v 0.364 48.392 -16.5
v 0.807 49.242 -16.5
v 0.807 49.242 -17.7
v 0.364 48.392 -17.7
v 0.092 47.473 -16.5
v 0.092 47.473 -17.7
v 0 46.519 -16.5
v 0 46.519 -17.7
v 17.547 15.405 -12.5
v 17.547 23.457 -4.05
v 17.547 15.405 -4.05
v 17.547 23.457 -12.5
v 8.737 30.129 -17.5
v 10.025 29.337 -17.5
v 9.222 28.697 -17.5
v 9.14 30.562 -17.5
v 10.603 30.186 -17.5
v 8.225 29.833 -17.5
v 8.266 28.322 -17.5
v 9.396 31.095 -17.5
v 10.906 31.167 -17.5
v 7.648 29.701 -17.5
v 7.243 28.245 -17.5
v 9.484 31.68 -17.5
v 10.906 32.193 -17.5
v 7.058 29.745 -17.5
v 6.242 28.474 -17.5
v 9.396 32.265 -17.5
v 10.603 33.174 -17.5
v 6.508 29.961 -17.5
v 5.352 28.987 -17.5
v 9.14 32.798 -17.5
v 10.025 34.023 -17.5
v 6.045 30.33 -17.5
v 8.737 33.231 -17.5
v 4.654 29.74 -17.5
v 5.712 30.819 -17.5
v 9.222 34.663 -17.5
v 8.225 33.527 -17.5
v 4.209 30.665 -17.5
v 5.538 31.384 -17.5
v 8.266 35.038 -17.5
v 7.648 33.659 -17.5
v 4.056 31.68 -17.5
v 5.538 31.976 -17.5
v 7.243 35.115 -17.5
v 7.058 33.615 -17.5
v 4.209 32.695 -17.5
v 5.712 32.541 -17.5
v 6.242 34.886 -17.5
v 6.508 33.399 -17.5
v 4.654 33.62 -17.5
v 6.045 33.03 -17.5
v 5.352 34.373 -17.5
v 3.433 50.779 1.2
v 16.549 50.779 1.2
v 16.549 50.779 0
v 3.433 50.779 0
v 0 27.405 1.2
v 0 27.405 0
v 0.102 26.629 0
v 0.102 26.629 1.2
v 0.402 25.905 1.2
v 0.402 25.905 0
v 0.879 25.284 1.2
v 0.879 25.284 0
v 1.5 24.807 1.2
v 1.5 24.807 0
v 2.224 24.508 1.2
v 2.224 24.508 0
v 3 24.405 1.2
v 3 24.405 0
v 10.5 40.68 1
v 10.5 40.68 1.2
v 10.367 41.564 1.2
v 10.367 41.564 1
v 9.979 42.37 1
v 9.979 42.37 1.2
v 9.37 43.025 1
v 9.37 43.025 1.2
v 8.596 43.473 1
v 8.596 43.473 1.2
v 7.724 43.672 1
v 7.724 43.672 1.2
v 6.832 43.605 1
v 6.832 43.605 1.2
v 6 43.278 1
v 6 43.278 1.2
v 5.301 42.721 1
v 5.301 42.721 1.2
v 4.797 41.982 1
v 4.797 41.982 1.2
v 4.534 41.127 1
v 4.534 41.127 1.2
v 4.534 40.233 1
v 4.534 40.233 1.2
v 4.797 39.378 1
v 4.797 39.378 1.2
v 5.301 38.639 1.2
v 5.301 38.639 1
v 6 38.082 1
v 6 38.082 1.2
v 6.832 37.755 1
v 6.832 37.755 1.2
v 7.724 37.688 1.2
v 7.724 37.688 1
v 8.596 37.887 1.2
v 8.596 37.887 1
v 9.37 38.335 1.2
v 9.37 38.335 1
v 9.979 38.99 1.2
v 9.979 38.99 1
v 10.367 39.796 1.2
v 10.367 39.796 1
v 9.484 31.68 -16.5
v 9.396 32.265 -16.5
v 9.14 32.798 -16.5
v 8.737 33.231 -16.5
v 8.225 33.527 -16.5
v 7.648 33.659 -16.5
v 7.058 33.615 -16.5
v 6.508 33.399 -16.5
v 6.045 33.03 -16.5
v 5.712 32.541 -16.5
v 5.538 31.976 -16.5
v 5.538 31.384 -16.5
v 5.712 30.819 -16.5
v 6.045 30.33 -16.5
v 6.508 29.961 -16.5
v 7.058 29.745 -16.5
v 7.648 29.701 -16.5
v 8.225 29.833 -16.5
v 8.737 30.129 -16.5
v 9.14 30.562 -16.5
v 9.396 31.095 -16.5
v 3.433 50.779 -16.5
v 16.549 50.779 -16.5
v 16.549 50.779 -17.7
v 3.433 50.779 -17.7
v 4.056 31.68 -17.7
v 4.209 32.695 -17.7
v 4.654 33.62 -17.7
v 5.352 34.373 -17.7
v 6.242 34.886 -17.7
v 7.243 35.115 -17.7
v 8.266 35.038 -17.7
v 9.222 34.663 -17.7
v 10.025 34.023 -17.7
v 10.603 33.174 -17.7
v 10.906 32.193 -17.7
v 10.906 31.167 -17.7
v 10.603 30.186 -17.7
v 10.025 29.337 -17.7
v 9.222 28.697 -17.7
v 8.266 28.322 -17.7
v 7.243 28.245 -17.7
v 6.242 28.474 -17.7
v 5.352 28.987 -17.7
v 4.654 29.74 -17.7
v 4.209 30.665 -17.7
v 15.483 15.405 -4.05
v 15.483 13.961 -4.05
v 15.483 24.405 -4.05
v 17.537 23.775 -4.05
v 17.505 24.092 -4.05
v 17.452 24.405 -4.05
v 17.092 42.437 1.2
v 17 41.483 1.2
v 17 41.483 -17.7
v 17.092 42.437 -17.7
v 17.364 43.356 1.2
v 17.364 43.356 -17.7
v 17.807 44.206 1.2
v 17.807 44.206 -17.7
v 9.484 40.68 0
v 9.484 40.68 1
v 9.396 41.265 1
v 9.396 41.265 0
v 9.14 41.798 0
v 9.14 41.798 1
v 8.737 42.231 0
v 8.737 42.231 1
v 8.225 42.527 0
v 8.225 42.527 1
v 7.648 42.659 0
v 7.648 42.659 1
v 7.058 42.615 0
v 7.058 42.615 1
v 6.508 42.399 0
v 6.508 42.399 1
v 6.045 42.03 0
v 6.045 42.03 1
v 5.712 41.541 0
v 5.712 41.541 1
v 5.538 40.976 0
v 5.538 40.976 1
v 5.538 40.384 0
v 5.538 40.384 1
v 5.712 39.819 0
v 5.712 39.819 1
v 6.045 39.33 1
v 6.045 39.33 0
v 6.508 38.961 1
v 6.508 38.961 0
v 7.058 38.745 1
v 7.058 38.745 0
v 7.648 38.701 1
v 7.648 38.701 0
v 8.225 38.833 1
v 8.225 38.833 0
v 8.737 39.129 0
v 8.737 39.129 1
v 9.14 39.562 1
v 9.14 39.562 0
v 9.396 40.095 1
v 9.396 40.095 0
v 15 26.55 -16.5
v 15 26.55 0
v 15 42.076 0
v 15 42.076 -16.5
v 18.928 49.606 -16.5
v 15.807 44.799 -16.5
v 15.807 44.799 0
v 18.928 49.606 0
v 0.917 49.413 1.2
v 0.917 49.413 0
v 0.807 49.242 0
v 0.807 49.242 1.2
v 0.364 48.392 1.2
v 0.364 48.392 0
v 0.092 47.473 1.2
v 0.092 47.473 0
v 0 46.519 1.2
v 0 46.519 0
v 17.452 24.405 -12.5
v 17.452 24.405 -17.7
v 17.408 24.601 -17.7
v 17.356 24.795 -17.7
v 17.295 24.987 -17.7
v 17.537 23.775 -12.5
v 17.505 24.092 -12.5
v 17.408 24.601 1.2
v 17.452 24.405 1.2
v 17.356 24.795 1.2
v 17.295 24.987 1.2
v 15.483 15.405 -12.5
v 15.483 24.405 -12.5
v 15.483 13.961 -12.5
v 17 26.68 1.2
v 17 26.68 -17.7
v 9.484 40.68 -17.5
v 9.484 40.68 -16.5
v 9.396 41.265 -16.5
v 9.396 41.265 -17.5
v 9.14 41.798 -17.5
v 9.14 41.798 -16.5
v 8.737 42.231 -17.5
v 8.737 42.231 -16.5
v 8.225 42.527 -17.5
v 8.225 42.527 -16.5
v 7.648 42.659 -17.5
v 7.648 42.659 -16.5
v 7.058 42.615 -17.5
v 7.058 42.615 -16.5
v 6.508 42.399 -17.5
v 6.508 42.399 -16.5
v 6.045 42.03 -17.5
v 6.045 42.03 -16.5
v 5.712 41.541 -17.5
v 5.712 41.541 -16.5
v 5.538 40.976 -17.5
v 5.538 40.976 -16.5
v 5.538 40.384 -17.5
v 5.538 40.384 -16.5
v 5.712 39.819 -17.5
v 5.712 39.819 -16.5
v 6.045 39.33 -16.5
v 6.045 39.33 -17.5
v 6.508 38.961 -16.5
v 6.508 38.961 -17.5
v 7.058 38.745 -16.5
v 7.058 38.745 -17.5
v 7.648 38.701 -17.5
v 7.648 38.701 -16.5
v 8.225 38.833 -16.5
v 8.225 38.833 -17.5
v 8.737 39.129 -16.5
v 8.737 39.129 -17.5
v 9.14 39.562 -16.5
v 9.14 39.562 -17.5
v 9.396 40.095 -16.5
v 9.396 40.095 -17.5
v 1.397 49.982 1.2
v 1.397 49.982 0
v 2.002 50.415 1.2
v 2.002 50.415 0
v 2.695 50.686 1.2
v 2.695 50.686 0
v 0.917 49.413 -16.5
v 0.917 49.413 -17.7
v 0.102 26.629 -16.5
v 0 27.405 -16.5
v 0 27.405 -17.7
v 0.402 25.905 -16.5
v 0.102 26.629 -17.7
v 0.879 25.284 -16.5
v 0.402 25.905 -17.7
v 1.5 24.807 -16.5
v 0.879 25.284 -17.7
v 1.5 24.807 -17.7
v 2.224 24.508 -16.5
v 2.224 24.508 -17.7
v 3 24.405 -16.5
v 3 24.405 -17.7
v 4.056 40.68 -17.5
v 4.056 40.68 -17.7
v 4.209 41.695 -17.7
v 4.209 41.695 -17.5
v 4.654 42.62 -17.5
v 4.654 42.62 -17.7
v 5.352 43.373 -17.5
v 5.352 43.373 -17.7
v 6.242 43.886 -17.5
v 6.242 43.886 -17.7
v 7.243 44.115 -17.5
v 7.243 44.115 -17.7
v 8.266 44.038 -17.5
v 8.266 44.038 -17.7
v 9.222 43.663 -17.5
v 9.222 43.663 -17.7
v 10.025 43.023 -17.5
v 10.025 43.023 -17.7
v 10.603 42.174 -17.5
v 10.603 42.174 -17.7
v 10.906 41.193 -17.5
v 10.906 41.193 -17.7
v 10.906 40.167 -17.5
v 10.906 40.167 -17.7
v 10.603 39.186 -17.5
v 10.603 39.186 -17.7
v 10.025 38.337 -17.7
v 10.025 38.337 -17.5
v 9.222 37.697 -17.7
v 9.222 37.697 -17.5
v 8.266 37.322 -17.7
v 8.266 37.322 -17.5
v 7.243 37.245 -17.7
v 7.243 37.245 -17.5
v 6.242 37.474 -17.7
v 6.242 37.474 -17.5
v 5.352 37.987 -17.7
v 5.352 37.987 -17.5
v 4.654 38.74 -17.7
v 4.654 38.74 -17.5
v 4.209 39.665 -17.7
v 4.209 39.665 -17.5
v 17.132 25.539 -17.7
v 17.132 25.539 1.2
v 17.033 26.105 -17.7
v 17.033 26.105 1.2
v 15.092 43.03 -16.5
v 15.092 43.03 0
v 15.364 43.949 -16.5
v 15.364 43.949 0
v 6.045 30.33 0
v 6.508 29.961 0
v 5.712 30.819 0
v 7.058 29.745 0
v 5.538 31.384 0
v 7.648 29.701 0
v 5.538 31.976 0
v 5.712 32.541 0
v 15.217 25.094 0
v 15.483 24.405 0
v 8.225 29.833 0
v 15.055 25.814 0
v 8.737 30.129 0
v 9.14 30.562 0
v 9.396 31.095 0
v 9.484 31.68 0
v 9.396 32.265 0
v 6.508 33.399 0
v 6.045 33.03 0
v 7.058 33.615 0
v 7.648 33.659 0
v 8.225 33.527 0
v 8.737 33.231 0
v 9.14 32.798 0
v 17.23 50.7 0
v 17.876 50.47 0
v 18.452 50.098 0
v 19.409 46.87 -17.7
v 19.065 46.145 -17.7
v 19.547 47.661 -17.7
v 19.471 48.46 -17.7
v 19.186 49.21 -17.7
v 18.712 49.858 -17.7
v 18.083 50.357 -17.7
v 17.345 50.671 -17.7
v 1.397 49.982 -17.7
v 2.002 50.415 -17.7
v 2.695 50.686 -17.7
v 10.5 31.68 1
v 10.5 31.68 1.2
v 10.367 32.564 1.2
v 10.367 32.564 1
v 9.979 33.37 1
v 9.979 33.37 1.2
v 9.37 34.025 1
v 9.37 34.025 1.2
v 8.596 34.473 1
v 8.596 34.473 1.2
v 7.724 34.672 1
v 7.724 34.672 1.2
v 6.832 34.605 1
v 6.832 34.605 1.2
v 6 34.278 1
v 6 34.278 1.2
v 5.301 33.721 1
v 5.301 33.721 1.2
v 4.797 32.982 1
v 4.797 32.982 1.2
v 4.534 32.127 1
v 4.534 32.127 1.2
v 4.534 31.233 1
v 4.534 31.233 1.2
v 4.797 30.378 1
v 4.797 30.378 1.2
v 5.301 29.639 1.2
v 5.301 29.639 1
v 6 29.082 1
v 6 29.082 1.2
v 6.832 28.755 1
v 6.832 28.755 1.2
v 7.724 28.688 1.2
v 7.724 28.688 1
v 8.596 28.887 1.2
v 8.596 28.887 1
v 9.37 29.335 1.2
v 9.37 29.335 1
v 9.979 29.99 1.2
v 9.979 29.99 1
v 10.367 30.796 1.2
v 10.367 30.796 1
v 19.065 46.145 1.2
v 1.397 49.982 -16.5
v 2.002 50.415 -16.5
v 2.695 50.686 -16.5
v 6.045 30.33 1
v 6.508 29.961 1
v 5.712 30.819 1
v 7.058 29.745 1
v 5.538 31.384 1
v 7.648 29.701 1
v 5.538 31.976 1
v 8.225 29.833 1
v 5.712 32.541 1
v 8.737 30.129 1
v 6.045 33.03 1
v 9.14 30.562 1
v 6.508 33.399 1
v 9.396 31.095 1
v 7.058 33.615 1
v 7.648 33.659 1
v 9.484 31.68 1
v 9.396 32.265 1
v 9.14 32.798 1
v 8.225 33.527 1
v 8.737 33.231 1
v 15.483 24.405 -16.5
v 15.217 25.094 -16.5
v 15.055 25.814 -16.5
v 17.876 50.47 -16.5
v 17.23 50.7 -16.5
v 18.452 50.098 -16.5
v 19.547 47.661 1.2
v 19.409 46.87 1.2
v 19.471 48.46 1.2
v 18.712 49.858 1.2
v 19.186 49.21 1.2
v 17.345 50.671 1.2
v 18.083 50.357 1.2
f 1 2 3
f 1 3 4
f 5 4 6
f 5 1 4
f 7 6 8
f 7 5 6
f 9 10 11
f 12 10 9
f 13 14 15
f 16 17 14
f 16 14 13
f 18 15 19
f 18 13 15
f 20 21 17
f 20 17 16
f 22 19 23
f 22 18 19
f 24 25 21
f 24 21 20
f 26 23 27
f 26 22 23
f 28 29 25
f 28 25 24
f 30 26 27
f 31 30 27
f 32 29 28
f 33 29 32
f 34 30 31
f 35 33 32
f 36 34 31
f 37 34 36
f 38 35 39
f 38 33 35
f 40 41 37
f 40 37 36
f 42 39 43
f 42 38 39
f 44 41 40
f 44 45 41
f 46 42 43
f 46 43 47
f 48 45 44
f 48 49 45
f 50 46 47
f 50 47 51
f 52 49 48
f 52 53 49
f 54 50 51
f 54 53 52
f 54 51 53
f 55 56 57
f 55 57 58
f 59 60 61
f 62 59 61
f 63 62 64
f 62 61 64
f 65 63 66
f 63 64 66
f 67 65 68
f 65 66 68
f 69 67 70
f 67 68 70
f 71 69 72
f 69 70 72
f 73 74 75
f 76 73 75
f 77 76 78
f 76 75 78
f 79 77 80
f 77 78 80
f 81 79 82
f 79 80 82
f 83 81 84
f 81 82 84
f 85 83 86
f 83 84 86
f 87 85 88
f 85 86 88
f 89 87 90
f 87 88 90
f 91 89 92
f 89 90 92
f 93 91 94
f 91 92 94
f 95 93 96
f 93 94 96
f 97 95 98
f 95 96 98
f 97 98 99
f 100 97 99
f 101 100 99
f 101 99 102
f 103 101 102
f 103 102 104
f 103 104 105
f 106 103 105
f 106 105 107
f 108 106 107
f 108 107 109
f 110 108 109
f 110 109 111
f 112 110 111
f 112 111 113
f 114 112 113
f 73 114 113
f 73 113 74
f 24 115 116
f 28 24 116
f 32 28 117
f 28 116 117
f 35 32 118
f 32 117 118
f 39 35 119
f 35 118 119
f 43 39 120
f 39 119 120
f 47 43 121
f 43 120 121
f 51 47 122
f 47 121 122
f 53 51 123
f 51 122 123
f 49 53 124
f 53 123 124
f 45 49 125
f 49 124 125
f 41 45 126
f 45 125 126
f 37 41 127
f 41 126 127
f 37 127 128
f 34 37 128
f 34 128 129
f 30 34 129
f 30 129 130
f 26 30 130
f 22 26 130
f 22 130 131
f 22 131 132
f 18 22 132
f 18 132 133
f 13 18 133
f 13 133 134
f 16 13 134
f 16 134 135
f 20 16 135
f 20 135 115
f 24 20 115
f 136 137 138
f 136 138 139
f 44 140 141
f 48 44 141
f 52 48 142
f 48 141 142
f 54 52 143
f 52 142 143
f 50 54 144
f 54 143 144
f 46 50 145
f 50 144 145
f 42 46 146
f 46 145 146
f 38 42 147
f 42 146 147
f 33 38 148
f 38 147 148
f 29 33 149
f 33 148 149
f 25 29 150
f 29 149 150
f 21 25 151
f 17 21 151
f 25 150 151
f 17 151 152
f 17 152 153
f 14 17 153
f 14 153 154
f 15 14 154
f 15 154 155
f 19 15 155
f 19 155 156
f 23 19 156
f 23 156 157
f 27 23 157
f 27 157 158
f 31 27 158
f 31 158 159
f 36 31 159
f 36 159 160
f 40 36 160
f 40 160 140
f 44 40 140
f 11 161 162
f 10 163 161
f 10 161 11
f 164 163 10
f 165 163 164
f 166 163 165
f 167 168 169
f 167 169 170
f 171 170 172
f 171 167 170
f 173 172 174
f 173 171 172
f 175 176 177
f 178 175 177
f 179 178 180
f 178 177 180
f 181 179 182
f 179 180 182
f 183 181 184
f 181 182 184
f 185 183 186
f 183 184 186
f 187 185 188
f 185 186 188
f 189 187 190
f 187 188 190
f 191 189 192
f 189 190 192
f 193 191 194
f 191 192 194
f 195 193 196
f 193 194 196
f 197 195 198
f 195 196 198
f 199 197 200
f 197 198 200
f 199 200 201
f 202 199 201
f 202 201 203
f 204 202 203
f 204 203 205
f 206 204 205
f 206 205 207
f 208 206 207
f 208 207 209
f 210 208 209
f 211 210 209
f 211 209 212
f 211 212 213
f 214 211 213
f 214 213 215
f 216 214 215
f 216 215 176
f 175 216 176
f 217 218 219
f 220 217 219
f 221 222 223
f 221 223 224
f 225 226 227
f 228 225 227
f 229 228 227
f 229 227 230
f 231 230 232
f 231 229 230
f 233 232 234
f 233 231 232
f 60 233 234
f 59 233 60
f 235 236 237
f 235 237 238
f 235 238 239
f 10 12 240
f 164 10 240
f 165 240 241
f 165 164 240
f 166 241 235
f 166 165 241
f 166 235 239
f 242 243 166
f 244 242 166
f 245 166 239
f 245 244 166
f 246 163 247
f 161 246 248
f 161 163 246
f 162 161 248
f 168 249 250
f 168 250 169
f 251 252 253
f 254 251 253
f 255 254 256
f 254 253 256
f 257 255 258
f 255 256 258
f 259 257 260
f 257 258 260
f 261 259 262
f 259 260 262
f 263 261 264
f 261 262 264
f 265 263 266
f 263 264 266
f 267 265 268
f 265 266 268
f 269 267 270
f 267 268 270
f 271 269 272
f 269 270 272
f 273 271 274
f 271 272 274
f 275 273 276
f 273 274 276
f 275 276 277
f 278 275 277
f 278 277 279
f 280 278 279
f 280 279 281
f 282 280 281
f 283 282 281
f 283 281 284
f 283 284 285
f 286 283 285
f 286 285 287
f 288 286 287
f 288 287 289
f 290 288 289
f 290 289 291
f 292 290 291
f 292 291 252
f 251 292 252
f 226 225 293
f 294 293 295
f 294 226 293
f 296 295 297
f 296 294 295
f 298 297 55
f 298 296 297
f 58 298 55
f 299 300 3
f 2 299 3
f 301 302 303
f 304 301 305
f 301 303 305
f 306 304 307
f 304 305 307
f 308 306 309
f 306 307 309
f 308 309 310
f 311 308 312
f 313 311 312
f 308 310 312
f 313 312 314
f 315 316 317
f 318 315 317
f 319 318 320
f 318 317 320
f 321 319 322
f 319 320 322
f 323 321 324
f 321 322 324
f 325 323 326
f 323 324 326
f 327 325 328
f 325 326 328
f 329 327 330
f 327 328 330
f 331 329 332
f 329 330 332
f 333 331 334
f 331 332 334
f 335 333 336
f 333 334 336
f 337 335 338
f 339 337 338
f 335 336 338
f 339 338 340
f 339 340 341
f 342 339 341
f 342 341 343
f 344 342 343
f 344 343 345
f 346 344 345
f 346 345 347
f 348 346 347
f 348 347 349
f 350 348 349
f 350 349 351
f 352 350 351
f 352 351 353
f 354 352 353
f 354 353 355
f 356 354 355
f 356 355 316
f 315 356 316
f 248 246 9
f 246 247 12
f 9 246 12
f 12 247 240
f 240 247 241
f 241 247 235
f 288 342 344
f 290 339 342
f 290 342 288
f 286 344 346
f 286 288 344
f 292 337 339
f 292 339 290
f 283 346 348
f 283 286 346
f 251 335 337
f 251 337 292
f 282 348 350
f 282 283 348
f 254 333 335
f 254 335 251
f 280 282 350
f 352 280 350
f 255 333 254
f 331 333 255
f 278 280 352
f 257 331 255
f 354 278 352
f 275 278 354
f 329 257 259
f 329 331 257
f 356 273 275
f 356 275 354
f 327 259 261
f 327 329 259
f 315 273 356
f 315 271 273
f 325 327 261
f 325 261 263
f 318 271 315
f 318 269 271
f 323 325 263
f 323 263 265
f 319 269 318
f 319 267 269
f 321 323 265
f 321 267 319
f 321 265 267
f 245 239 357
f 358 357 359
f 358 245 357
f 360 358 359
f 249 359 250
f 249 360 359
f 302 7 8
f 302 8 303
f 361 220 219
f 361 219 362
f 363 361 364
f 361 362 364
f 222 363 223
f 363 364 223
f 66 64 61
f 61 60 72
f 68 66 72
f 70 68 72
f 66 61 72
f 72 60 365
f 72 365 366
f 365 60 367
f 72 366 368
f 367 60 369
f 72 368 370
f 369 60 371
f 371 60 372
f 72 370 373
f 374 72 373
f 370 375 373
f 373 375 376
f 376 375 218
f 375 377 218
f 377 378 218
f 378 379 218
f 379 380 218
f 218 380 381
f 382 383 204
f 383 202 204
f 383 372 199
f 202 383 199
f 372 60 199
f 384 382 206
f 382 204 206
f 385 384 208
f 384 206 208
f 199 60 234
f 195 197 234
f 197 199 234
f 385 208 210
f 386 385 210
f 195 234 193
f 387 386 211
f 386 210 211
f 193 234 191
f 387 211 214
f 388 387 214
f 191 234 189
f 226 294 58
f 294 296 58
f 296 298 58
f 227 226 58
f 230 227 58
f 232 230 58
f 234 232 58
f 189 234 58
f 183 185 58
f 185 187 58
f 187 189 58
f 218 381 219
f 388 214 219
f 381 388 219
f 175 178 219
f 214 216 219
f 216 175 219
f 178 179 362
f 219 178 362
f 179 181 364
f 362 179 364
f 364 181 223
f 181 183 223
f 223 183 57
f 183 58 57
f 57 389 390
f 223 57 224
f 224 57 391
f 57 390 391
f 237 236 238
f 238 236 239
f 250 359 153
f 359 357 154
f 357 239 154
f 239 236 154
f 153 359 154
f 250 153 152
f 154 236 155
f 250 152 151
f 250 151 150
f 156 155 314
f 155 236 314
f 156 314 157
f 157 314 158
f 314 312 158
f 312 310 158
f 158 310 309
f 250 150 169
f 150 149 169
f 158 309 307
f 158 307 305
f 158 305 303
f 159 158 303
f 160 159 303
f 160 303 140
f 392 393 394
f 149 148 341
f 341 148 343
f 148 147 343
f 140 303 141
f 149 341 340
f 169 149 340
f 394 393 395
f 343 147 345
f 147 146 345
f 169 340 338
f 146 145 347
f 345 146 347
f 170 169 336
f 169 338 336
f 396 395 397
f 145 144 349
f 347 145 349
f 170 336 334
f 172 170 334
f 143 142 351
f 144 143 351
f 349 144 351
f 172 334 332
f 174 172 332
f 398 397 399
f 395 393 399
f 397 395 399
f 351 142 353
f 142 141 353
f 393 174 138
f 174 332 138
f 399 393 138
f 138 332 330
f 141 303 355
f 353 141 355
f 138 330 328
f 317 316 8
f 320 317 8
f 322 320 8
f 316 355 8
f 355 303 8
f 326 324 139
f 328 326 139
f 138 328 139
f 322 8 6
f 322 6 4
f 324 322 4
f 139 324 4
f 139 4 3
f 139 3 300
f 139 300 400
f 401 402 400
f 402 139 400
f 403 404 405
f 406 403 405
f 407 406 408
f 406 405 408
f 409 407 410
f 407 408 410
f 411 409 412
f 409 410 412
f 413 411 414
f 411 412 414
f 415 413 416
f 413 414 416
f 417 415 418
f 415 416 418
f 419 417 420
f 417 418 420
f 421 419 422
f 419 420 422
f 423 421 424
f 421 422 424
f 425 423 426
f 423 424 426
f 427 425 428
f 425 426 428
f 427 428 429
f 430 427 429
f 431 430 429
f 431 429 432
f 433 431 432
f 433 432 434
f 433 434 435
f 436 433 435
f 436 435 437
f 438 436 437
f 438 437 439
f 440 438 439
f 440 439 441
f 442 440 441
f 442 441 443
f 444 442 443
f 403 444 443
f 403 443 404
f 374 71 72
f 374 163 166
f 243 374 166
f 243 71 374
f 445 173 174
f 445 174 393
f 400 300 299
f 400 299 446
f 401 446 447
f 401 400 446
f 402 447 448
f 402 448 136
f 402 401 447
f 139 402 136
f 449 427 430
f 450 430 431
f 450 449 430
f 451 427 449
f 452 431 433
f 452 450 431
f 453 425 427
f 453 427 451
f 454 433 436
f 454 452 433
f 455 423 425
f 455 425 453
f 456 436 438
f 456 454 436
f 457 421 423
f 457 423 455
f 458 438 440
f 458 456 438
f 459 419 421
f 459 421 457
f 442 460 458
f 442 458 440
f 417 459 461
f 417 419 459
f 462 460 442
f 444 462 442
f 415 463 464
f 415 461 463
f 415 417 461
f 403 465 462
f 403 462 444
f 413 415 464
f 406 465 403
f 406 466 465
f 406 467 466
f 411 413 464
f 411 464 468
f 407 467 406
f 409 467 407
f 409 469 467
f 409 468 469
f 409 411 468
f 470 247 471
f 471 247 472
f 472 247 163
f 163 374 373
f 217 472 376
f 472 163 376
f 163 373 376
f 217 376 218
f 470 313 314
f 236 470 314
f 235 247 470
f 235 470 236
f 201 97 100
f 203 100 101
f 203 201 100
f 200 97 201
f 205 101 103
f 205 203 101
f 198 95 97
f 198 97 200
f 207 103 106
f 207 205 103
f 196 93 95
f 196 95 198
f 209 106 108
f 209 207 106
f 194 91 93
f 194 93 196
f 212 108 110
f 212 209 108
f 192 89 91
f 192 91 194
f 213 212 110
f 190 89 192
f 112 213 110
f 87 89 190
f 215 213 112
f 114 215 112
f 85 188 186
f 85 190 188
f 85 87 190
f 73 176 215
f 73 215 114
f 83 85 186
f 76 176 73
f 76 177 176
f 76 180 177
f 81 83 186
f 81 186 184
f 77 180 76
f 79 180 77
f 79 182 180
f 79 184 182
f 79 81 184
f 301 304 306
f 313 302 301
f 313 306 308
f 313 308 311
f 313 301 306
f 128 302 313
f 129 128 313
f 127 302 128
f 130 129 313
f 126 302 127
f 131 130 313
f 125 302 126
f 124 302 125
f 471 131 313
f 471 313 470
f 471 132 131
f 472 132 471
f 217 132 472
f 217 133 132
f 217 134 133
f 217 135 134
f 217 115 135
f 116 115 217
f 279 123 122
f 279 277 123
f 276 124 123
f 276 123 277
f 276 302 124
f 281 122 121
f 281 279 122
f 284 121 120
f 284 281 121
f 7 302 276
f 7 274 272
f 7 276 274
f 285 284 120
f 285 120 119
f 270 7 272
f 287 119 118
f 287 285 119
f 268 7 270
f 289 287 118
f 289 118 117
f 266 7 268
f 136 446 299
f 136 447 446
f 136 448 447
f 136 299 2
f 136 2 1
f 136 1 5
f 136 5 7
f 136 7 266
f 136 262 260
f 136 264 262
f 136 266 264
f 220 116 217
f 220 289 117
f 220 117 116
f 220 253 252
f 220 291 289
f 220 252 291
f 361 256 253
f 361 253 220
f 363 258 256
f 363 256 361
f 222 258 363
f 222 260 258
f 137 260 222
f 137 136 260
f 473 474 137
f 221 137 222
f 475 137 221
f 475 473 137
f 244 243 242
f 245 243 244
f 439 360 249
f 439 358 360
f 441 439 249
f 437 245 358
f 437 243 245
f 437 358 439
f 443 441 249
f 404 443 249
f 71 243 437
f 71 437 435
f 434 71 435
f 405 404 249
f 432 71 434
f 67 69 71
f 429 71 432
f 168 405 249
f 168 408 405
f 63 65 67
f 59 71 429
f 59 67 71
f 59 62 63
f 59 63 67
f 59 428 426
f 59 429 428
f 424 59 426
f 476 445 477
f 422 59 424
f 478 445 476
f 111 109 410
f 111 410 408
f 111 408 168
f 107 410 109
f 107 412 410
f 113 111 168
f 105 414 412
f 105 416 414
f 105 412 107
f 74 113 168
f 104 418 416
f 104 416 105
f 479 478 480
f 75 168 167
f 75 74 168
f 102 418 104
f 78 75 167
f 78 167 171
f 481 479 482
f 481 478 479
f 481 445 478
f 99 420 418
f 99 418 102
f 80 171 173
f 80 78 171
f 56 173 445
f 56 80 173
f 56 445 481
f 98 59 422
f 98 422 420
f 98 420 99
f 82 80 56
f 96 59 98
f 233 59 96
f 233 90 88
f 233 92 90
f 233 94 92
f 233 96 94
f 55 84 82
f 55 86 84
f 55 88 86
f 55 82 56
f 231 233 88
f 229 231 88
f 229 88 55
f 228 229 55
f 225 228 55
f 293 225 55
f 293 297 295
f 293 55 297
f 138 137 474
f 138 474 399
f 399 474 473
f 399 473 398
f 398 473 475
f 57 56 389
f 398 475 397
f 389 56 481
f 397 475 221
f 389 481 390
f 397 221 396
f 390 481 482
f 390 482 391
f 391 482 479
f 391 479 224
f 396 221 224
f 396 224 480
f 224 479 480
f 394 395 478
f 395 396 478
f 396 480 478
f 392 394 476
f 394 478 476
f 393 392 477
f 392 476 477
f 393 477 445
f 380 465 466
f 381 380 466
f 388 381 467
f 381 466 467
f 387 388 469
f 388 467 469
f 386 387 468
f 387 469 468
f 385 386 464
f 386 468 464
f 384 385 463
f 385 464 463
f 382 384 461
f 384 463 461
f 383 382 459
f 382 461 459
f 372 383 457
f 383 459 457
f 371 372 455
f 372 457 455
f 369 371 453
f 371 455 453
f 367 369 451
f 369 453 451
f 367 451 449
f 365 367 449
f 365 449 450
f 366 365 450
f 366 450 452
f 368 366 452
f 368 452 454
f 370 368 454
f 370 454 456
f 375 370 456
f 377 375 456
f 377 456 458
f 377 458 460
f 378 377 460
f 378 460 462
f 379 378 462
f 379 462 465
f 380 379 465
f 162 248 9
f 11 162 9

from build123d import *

# Parameters (mm, degrees)
BOSS_EXTRUDE1_START = 2
BOSS_EXTRUDE1_DEPTH = 20.5
CUT_EXTRUDE1_DEPTH  = 8.25
SKETCH4_R           = 1.984375
CUT_EXTRUDE2_DEPTH  = 60.042444086
SKETCH5_R           = 3
CUT_EXTRUDE3_DEPTH  = 1
SKETCH6_R           = 3.444339348
CUT_EXTRUDE4_DEPTH  = 1
FILLET1_R           = 3
SKETCH9_W           = 2.063859561
SKETCH9_H           = 8.45
BOSS_EXTRUDE4_DEPTH = 9
BOSS_EXTRUDE5_DEPTH = 8.45
CUT_EXTRUDE5_DEPTH  = 59.145478277
FILLET3_R           = 3
SKETCH12_W          = 4.417525097
SKETCH12_H          = 36.817204543
CUT_EXTRUDE6_DEPTH  = 58.470832985


with BuildPart() as part:
    # Sketch1 → Boss-Extrude1 (new body)
    with BuildSketch(Plane.XY.offset(BOSS_EXTRUDE1_START)):
        with BuildLine():
            Line((17, 26.68), (17, 41.483303111))
            ThreePointArc((17, 41.483303111), (17.205901326, 42.903379834), (17.80664716, 44.206498286))
            Line((17.80664716, 44.206498286), (22.074645554, 50.778639479))
            Line((22.074645554, 50.778639479), (1.804469576, 50.778639479))
            Line((1.804469576, 50.778639479), (0.80664716, 49.2421277))
            ThreePointArc((0.80664716, 49.2421277), (0.205901326, 47.939009249), (0, 46.518932525))
            Line((0, 46.518932525), (0, 24.405491581))
            Line((0, 24.405491581), (17.547291672, 24.405491581))
            ThreePointArc((17.547291672, 24.405491581), (17.138748019, 25.51028671), (17, 26.68))
        make_face()
    extrude(amount=-BOSS_EXTRUDE1_DEPTH)

    # Sketch2 → Cut-Extrude1 (cut, symmetric)
    with BuildSketch(Plane.XY.offset(-8.25)):
        with BuildLine():
            Line((1.804469576, 50.778639479), (0.80664716, 49.2421277))
            ThreePointArc((0.80664716, 49.2421277), (0.205901326, 47.939009249), (0, 46.518932525))
            Line((0, 46.518932525), (0, 24.405491581))
            Line((0, 24.405491581), (15.483432111, 24.405491581))
            ThreePointArc((15.483432111, 24.405491581), (15.122355105, 25.45104141), (15, 26.550395893))
            Line((15, 26.550395893), (15, 42.075730101))
            ThreePointArc((15, 42.075730101), (15.205901326, 43.495806824), (15.80664716, 44.798925276))
            Line((15.80664716, 44.798925276), (19.689918969, 50.778639479))
            Line((19.689918969, 50.778639479), (1.804469576, 50.778639479))
        make_face()
    extrude(amount=CUT_EXTRUDE1_DEPTH, both=True, mode=Mode.SUBTRACT)

    # Sketch4 → Cut-Extrude2 (cut, through all)
    with BuildSketch(Plane.XY.offset(2)):
        with Locations((7.5, 40.68)):
            Circle(SKETCH4_R)
        with Locations((7.5, 31.68)):
            Circle(SKETCH4_R)
    extrude(amount=-CUT_EXTRUDE2_DEPTH, mode=Mode.SUBTRACT)

    # Sketch5 → Cut-Extrude3 (cut)
    with BuildSketch(Plane.XY.offset(2)):
        with Locations((7.5, 40.68)):
            Circle(SKETCH5_R)
        with Locations((7.5, 31.68)):
            Circle(SKETCH5_R)
    extrude(amount=-CUT_EXTRUDE3_DEPTH, mode=Mode.SUBTRACT)

    # Sketch6 → Cut-Extrude4 (cut)
    with BuildSketch(Plane(origin=(0, 0, -18.5), x_dir=(-1, 0, 0), z_dir=(0, 0, -1))):
        with Locations((-7.5, 40.68)):
            Circle(SKETCH6_R)
        with Locations((-7.5, 31.68)):
            Circle(SKETCH6_R)
    extrude(amount=-CUT_EXTRUDE4_DEPTH, mode=Mode.SUBTRACT)

    # Fillet1
    # the kernel refuses this fillet: 3 mm, written as the material it takes off along each edge
    with BuildSketch(Plane(origin=(22.074645554, 50.778639479, 15.813281645), x_dir=(-0.5446390350150283, -0.8386705679454232, 0), z_dir=(0, 0, -1))) as fillet1_piece_1:
        with BuildLine():
            CenterArc((FILLET1_R * 1.84177088603, FILLET1_R), FILLET1_R, 147, 123)
            Line((FILLET1_R * 1.00310031809, FILLET1_R * 1.54463903502), (0, 0))
            Line((0, 0), (FILLET1_R * 1.84177088603, 0))
        make_face()
    extrude(amount=48.126563291, mode=Mode.SUBTRACT)

    # Sketch9 → Boss-Extrude4 (add)
    with BuildSketch(Plane(origin=(0, 24.405491581, 0), x_dir=(-1, 0, 0), z_dir=(0, -1, 0))):
        with Locations((-16.515361891, 8.275)):
            Rectangle(SKETCH9_W, SKETCH9_H)
    extrude(amount=BOSS_EXTRUDE4_DEPTH)

    # Sketch10 → Boss-Extrude5 (add)
    with BuildSketch(Plane.XY.offset(-4.05)):
        Polygon((15.483432111, 15.405491581), (15.483432111, 13.961434936), (17.547291672, 15.405491581), align=None)
    extrude(amount=-BOSS_EXTRUDE5_DEPTH)

    # Sketch11 → Cut-Extrude5 (cut, through all)
    with BuildSketch(Plane.XY.offset(2)):
        with BuildLine():
            Line((17.264521068, 25.075244788), (17.547291672, 25.075244788))
            Line((17.547291672, 25.075244788), (17.547291672, 23.456711585))
            ThreePointArc((17.547291672, 23.456711585), (17.476067665, 24.278235922), (17.264521068, 25.075244788))
        make_face()
    extrude(amount=-CUT_EXTRUDE5_DEPTH, mode=Mode.SUBTRACT)

    # Fillet3
    fillet3_edges = [part.edges().sort_by_distance(p)[0] for p in [
        (0, 24.405491581, -17.5),
        (1.804469576, 50.778639479, -17.5),
        (1.804469576, 50.778639479, 1),
        (0, 24.405491581, 1),
    ]]
    fillet(fillet3_edges, radius=FILLET3_R)

    # Sketch12 → Cut-Extrude6 (cut, through all)
    with BuildSketch(Plane.ZY):
        with Locations((-19.908762549, 32.370037208)):
            Rectangle(SKETCH12_W, SKETCH12_H)
        with Locations((3.408762549, 32.370037208)):
            Rectangle(SKETCH12_W, SKETCH12_H)
    extrude(amount=-CUT_EXTRUDE6_DEPTH, mode=Mode.SUBTRACT)


solid = part.part
